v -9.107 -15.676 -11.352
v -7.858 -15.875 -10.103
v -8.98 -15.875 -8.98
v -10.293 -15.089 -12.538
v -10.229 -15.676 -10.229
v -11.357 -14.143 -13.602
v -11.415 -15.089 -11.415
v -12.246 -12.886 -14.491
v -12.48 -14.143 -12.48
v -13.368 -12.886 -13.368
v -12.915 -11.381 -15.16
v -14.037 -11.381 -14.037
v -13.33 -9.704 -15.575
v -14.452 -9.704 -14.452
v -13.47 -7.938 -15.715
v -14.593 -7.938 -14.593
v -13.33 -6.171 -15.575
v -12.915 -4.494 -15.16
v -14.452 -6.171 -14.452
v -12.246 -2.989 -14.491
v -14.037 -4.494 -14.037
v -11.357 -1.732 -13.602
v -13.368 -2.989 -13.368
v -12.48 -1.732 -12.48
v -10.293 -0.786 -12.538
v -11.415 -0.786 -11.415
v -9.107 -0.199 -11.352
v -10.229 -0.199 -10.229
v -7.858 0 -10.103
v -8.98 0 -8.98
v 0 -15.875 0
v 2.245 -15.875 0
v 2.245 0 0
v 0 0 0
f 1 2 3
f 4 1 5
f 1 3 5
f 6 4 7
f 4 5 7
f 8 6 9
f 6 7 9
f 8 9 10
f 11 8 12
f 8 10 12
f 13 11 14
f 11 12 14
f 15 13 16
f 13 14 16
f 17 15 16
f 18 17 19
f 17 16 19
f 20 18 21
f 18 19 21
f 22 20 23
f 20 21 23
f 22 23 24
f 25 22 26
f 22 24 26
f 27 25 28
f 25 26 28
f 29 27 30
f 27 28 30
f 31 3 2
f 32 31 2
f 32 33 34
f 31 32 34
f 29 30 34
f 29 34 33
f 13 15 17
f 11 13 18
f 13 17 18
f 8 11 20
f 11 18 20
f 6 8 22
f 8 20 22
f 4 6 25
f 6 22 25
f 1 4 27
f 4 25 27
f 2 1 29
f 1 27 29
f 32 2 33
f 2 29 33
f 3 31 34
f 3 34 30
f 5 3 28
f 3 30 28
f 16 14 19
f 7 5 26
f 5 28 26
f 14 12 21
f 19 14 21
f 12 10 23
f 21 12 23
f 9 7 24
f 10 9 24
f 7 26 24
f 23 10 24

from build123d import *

# Parameters (mm, degrees)
F1_DEPTH = 15.875
F3_DEPTH = 12.701


with BuildPart() as f1:
    # F0 (on Front) → F1 (new body)
    with BuildSketch(Plane.XZ):
        Polygon((2.245064, 0), (0, 0), (-14.592916, -14.592916), (-13.470384, -15.715448), align=None)
    extrude(amount=F1_DEPTH)

    # F2 (on face) → F3 (cut, through all)
    with BuildSketch(Plane(origin=(0, 0, 0), x_dir=(0, -1, 0), z_dir=(-0.707107, 0, 0.707107))):
        with BuildLine():
            ThreePointArc((7.9375, -20.6375), (2.32484, -18.31266), (0, -12.7))
            Line((0, -12.7), (0, -20.6375))
            Line((0, -20.6375), (7.9375, -20.6375))
        make_face()
        with BuildLine():
            ThreePointArc((15.875, -12.7), (13.55016, -18.31266), (7.9375, -20.6375))
            Line((7.9375, -20.6375), (15.875, -20.6375))
            Line((15.875, -20.6375), (15.875, -12.7))
        make_face()
    extrude(amount=-F3_DEPTH, mode=Mode.SUBTRACT)


solid = f1.part
